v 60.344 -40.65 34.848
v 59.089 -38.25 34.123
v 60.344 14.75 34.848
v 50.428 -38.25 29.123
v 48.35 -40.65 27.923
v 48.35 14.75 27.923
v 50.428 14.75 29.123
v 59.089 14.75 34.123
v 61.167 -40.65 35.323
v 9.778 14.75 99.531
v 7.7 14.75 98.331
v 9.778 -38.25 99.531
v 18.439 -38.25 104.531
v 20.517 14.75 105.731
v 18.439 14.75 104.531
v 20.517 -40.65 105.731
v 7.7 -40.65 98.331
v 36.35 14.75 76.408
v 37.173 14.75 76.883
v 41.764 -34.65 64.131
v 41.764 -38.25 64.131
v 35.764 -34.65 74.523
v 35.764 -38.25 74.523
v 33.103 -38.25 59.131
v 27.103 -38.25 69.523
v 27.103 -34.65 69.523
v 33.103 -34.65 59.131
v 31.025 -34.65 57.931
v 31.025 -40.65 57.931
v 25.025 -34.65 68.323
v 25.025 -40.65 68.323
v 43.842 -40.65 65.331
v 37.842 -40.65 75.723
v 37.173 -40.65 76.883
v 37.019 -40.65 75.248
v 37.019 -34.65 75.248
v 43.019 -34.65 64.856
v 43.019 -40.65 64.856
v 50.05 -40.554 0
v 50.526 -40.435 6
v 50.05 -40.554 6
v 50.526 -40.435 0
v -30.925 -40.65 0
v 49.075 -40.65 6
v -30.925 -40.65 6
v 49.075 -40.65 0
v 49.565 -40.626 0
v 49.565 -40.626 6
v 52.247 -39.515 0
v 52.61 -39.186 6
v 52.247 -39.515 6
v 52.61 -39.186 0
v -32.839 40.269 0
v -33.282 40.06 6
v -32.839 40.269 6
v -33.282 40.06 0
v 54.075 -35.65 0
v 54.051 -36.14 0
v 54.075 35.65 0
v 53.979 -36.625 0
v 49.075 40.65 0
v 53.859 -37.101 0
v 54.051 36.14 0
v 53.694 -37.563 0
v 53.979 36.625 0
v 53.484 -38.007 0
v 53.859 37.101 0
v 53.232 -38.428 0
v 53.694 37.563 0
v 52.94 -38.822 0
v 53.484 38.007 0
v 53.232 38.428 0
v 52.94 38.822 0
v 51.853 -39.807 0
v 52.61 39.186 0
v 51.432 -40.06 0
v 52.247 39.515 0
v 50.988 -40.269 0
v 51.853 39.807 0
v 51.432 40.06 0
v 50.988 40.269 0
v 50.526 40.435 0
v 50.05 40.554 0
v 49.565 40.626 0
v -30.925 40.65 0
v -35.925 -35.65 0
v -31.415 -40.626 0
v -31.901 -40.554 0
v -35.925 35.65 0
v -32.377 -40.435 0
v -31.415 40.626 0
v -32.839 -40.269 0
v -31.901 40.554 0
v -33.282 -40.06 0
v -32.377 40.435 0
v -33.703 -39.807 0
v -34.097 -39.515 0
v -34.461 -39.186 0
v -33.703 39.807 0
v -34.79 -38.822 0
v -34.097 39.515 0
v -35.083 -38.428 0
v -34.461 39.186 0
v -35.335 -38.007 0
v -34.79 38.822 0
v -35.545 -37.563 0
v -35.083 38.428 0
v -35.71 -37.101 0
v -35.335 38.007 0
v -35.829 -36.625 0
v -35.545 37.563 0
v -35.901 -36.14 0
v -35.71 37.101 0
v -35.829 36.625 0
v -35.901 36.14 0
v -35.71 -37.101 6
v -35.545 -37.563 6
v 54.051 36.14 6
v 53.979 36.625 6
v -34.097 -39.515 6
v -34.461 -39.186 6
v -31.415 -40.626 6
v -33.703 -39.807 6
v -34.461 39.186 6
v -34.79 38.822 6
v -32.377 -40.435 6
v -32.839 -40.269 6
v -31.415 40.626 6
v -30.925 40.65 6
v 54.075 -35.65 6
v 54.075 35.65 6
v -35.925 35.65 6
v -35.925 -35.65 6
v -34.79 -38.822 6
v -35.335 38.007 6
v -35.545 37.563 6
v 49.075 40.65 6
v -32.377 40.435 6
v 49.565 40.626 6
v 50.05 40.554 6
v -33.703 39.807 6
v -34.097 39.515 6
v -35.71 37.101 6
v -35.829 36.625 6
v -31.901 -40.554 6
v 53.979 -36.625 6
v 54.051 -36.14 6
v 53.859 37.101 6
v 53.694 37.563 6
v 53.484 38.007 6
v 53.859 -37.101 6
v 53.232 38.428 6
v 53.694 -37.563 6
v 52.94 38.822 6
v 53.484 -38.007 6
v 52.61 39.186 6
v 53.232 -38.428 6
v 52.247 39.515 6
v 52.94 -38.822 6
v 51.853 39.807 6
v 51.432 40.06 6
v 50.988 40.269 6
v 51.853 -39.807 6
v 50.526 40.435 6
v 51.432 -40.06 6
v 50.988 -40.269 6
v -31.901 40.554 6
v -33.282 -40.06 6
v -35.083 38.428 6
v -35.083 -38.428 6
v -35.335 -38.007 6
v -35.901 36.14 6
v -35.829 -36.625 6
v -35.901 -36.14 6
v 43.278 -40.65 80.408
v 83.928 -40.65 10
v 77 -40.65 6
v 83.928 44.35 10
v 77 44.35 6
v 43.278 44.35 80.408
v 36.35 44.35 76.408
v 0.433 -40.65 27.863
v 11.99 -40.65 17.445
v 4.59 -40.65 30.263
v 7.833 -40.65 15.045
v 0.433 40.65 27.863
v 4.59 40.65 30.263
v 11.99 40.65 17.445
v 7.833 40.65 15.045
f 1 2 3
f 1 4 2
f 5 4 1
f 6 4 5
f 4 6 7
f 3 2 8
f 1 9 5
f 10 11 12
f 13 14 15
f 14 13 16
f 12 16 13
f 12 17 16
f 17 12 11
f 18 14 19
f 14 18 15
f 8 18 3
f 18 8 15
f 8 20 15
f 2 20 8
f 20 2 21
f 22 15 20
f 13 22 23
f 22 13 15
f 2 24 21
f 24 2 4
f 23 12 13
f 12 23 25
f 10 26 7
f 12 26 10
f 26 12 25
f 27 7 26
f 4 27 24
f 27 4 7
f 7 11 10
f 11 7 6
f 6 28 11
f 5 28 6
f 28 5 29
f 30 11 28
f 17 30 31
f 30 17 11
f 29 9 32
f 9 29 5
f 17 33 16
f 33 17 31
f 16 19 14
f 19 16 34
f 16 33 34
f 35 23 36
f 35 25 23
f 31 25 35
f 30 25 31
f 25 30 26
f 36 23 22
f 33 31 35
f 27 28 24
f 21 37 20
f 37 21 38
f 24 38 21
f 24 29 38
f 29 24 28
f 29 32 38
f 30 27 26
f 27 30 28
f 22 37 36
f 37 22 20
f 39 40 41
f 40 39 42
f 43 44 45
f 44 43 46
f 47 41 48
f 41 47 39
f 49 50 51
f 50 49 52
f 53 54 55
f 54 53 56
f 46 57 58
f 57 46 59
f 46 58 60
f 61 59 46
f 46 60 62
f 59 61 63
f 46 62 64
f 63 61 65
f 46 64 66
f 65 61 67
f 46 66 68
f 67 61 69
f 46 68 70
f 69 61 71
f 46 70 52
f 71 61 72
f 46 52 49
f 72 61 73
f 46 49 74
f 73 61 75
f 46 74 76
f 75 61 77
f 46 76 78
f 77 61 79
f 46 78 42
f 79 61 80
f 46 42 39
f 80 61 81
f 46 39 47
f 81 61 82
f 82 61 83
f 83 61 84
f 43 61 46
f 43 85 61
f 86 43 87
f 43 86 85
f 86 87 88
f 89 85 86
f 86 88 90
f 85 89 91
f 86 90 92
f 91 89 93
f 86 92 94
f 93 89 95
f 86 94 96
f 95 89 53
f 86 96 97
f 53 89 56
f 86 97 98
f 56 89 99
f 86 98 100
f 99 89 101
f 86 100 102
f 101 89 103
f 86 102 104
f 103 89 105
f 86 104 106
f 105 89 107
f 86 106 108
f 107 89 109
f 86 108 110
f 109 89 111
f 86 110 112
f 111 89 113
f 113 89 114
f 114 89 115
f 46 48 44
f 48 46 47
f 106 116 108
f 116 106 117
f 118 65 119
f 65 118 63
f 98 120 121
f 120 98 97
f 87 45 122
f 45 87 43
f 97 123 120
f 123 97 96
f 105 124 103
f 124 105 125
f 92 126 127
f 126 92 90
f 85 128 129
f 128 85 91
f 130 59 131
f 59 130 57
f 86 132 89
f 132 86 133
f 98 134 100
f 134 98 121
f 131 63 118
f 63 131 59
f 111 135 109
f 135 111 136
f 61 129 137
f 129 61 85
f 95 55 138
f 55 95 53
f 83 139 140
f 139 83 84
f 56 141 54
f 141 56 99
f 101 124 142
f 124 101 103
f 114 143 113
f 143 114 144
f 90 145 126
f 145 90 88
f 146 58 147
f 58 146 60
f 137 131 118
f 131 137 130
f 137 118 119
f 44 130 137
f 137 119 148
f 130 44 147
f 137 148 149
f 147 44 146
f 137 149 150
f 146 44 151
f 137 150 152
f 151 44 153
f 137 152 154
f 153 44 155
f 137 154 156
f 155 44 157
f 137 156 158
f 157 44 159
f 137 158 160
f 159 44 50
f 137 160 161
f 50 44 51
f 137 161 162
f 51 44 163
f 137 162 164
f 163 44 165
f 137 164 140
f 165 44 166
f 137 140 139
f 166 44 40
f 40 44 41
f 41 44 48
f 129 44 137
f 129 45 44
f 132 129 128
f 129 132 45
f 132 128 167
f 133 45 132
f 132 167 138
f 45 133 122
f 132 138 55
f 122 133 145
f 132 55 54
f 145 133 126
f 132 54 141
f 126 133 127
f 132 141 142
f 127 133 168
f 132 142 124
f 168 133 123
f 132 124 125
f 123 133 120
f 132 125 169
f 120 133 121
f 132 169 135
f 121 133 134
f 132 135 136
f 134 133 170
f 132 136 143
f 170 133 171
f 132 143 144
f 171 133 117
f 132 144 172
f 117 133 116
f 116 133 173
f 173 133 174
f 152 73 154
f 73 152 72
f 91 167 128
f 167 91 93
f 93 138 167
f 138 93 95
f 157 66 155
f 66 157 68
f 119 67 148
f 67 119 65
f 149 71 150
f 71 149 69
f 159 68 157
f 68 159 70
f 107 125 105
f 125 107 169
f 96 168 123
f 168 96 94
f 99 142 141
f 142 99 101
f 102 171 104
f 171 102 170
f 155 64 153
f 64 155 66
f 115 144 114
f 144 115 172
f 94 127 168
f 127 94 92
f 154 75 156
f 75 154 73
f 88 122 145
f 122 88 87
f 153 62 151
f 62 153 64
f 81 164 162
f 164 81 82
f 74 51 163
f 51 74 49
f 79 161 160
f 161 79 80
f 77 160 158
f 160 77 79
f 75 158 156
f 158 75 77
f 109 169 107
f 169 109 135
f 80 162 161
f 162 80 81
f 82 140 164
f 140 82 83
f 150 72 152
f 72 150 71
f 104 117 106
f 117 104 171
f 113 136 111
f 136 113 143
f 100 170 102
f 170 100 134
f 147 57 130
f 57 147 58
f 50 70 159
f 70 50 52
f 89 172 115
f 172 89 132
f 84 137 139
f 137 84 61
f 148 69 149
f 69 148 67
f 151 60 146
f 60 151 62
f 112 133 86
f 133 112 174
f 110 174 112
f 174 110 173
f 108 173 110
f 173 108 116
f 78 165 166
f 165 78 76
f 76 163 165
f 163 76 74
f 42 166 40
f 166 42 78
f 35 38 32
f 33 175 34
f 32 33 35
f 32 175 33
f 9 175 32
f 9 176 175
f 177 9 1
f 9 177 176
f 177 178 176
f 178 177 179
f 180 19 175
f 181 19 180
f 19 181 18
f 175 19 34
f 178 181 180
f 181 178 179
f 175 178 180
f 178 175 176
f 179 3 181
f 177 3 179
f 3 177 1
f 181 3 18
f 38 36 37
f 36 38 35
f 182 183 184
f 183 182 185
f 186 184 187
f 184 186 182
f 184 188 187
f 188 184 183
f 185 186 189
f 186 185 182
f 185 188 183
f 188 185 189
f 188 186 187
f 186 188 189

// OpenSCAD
/* [Phone Dimensions] */
// Phone width (including case)
phone_width = 75; // [50:120]
// Phone thickness (including case)
phone_thickness = 9; // [5:20]

/* [Stand Geometry] */
// Recline angle from horizontal (degrees)
recline_angle = 60; // [30:80]
// Base depth (front to back)
base_depth = 90; // [60:150]
// Total stand height
stand_height = 85; // [50:120]

/* [Cradle & Slot] */
// Cradle wall thickness
cradle_wall = 2.4; // [1.2:0.4:5]
// Extra width clearance for phone fit
width_clearance = 1.5; // [0:0.5:5]
// Extra thickness clearance for phone fit
thickness_clearance = 1.0; // [0:0.5:5]
// Charging cable slot width
cable_slot_width = 12; // [6:20]
// Charging cable slot depth (from bottom of cradle)
cable_slot_depth = 6; // [3:15]

/* [Base & Stability] */
// Base thickness
base_thickness = 6; // [3:10]
// Back support thickness
back_thickness = 8; // [4:12]
// Front lip height (keeps phone from sliding out)
front_lip = 8; // [3:15]

/* [Hidden] */
$fn = 64;

// Derived values
slot_inner_width = phone_width + width_clearance;
slot_inner_thickness = phone_thickness + thickness_clearance;
cradle_outer_width = slot_inner_width + cradle_wall * 2;
cradle_outer_thickness = slot_inner_thickness + cradle_wall * 2;

// Effective depth of the cradle slot along the stand face
cradle_depth = phone_width * 0.6; // phone rests on lower portion

// Back face dimensions (the plane the phone rests against)
back_face_width = cradle_outer_width;
back_face_height = cradle_depth + front_lip + cradle_wall;

// Base footprint calculations for stability
base_rear_overhang = 5;
base_front_extension = base_depth - (stand_height / tan(recline_angle)) - base_rear_overhang;

module rounded_rect_2d(w, h, r) {
    offset(r = r) offset(r = -r) square([w, h]);
}

module cradle_profile() {
    // U-shaped slot profile, open at top (phone insertion side)
    difference() {
        square([cradle_outer_thickness, back_face_height]);
        translate([cradle_wall, cradle_wall])
            square([slot_inner_thickness, back_face_height]);
    }
}

module cable_slot_cut() {
    // Vertical slot through cradle bottom for cable
    slot_h = back_face_height + 2;
    translate([-0.5, -0.5, (cradle_outer_width - cable_slot_width) / 2])
        cube([cradle_outer_thickness + 1, cable_slot_depth + 0.5, cable_slot_width]);
}

module back_support() {
    // Triangular back support with rounded top
    hull() {
        // Bottom at rear of base
        translate([0, 0, 0])
            cube([back_thickness, base_thickness, back_face_width]);
        // Top where cradle attaches
        translate([0, stand_height - back_face_height, 0])
            cube([back_thickness, back_face_height, back_face_width]);
    }
}

module base_plate() {
    // Flat base with rounded corners
    linear_extrude(height = base_thickness)
        rounded_rect_2d(base_depth, back_face_width, 5);
}

module stand_assembly() {
    // Base centered on origin, sitting flat at z=0
    translate([-base_front_extension, -back_face_width/2, 0])
        base_plate();
    
    // Back support, angled so cradle sits at recline_angle
    // The back face leans back; angle from vertical is (90 - recline_angle)
    lean_from_vertical = 90 - recline_angle;
    
    translate([base_depth - base_rear_overhang - back_thickness, -back_face_width/2, base_thickness])
        rotate([0, -lean_from_vertical, 0])
        back_support();
    
    // Cradle attached to top of back support
    // Position calculated so cradle centerline is at proper angle
    cradle_pivot_x = base_depth - base_rear_overhang - back_thickness - (stand_height - back_face_height/2) * sin(lean_from_vertical);
    cradle_pivot_z = base_thickness + (stand_height - back_face_height/2) * cos(lean_from_vertical);
    
    translate([cradle_pivot_x, -back_face_width/2, cradle_pivot_z - back_face_height/2])
        rotate([0, -lean_from_vertical, 0])
        difference() {
            linear_extrude(height = back_face_width)
                cradle_profile();
            cable_slot_cut();
        }
    
    // Front lip/stop at bottom of cradle to prevent phone sliding out
    lip_x = cradle_pivot_x - back_face_height * sin(lean_from_vertical) - cradle_outer_thickness * cos(lean_from_vertical);
    lip_z = cradle_pivot_z - back_face_height * cos(lean_from_vertical) + cradle_outer_thickness * sin(lean_from_vertical);
    
    translate([lip_x, -back_face_width/2, lip_z])
        rotate([0, -lean_from_vertical, 0])
        cube([cradle_wall * 2, back_face_width, cradle_outer_thickness]);
}

// Main geometry
stand_assembly();
